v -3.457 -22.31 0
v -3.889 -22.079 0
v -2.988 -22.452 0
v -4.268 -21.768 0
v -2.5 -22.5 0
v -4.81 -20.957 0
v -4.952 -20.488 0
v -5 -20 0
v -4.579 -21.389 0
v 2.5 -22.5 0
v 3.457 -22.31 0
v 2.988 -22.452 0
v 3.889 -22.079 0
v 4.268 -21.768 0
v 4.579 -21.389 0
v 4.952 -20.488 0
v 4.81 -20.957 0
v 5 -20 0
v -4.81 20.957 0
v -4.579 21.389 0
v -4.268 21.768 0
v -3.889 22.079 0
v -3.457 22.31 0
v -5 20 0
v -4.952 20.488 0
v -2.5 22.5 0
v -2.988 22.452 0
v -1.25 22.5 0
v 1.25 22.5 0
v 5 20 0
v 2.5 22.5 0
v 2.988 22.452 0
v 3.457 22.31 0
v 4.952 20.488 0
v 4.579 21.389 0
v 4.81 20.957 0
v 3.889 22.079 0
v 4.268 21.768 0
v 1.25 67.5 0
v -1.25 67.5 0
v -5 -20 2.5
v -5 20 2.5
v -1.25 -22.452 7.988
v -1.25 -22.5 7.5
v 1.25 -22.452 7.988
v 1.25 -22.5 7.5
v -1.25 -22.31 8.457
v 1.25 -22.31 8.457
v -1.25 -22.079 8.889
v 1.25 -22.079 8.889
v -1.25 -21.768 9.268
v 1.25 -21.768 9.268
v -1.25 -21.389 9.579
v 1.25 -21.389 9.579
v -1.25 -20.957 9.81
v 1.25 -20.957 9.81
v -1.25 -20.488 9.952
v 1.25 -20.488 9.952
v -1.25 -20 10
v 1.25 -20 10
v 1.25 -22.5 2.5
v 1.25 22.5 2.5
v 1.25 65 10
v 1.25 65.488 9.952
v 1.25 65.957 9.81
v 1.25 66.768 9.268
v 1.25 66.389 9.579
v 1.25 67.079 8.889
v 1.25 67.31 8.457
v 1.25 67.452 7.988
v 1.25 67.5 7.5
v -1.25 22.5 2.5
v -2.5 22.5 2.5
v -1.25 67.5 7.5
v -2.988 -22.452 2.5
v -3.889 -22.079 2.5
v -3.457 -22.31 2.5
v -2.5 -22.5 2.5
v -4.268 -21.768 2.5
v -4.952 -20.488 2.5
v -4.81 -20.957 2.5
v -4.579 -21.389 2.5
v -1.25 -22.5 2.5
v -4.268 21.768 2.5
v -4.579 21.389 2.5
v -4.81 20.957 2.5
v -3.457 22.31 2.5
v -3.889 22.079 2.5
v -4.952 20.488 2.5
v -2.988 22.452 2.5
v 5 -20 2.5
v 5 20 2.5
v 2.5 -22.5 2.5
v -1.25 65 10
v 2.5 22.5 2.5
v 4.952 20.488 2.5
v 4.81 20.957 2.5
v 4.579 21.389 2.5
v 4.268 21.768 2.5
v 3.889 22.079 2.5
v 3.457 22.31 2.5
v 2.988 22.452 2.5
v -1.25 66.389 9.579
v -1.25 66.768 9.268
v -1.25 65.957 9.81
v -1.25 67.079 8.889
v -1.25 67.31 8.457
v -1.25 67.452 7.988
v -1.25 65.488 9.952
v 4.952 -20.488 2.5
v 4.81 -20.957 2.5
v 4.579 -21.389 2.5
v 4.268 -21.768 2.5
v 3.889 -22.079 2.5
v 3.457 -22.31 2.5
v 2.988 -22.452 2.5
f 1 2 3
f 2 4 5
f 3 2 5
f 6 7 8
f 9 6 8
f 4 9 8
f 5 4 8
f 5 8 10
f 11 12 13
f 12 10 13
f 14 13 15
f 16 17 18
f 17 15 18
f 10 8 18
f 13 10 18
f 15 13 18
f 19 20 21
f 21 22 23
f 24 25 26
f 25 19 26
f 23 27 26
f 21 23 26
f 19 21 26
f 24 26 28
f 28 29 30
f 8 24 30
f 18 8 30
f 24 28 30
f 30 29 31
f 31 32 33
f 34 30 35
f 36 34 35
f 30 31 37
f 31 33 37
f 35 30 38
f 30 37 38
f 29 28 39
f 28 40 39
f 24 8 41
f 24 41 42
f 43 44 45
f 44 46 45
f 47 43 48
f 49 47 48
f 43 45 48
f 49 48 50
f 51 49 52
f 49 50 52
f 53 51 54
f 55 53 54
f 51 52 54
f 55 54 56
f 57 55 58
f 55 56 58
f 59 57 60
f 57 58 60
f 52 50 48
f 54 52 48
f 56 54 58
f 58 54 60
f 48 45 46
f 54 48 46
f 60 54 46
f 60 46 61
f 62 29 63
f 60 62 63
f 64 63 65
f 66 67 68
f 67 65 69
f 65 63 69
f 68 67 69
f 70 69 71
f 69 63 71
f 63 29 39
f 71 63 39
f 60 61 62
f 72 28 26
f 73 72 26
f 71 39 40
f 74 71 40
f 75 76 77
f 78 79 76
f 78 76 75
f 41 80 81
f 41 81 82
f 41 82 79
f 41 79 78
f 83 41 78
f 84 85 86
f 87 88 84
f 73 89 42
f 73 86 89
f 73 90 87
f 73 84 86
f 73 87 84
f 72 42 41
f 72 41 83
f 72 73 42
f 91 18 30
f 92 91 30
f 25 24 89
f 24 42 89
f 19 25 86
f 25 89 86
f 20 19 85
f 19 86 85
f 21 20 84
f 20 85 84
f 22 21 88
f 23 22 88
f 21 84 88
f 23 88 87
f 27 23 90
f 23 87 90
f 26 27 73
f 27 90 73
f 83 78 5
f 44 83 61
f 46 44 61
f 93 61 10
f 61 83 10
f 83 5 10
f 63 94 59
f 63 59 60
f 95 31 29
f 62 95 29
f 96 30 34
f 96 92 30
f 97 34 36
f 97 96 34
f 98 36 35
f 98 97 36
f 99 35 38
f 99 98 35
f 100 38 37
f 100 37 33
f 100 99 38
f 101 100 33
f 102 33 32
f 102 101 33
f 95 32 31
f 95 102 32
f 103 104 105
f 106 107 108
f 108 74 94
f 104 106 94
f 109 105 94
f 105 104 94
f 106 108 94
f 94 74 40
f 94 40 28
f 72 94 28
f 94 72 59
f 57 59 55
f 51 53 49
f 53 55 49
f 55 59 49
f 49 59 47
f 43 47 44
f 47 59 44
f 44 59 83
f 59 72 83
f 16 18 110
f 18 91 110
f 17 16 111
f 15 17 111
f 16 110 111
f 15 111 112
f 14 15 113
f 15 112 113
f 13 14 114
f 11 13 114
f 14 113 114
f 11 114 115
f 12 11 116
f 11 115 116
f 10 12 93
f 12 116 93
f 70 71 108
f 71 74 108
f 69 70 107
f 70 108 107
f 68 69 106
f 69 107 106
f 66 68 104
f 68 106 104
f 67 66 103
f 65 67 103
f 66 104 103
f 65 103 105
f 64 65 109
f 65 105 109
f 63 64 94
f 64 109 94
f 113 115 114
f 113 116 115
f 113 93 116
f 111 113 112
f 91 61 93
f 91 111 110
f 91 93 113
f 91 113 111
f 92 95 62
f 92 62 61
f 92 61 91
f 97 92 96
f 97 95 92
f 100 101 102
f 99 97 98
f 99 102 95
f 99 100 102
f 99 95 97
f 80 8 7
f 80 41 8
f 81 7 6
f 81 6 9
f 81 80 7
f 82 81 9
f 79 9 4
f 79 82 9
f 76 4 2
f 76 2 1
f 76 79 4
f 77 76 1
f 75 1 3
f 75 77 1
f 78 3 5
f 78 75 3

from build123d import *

# Parameters (mm, degrees)
F0_W     = 1.25
F0_H     = 45
F1_DEPTH = 10
F0_W_2   = 3.75
F2_DEPTH = 2.5
F3_R     = 2.5
F4_R     = 2.5


with BuildPart() as f1:
    # F0 (on Top) → F1 (new body)
    with BuildSketch(Plane.XY):
        with Locations((-0.625, 45)):
            Rectangle(F0_W, F0_H)
        with Locations((0.625, 45)):
            Rectangle(F0_W, F0_H)
        with Locations((-0.625, 0)):
            Rectangle(F0_W, F0_H)
        with Locations((0.625, 0)):
            Rectangle(F0_W, F0_H)
    extrude(amount=F1_DEPTH)

    # F0 (on Top) → F2 (join)
    with BuildSketch(Plane.XY):
        with Locations((3.125, 0)):
            Rectangle(F0_W_2, F0_H)
        with Locations((-3.125, 0)):
            Rectangle(F0_W_2, F0_H)
        with Locations((0.625, 0)):
            Rectangle(F0_W, F0_H)
        with Locations((-0.625, 0)):
            Rectangle(F0_W, F0_H)
    extrude(amount=F2_DEPTH)

    # F3
    f3_edges = [f1.edges().sort_by_distance(p)[0] for p in [
        (5, 22.5, 1.25),
        (-5, 22.5, 1.25),
        (-5, -22.5, 1.25),
        (5, -22.5, 1.25),
    ]]
    fillet(f3_edges, radius=F3_R)

    # F4
    f4_edges = [f1.edges().sort_by_distance(p)[0] for p in [
        (0, -22.5, 10),
        (0, 67.5, 10),
    ]]
    fillet(f4_edges, radius=F4_R)


solid = f1.part
